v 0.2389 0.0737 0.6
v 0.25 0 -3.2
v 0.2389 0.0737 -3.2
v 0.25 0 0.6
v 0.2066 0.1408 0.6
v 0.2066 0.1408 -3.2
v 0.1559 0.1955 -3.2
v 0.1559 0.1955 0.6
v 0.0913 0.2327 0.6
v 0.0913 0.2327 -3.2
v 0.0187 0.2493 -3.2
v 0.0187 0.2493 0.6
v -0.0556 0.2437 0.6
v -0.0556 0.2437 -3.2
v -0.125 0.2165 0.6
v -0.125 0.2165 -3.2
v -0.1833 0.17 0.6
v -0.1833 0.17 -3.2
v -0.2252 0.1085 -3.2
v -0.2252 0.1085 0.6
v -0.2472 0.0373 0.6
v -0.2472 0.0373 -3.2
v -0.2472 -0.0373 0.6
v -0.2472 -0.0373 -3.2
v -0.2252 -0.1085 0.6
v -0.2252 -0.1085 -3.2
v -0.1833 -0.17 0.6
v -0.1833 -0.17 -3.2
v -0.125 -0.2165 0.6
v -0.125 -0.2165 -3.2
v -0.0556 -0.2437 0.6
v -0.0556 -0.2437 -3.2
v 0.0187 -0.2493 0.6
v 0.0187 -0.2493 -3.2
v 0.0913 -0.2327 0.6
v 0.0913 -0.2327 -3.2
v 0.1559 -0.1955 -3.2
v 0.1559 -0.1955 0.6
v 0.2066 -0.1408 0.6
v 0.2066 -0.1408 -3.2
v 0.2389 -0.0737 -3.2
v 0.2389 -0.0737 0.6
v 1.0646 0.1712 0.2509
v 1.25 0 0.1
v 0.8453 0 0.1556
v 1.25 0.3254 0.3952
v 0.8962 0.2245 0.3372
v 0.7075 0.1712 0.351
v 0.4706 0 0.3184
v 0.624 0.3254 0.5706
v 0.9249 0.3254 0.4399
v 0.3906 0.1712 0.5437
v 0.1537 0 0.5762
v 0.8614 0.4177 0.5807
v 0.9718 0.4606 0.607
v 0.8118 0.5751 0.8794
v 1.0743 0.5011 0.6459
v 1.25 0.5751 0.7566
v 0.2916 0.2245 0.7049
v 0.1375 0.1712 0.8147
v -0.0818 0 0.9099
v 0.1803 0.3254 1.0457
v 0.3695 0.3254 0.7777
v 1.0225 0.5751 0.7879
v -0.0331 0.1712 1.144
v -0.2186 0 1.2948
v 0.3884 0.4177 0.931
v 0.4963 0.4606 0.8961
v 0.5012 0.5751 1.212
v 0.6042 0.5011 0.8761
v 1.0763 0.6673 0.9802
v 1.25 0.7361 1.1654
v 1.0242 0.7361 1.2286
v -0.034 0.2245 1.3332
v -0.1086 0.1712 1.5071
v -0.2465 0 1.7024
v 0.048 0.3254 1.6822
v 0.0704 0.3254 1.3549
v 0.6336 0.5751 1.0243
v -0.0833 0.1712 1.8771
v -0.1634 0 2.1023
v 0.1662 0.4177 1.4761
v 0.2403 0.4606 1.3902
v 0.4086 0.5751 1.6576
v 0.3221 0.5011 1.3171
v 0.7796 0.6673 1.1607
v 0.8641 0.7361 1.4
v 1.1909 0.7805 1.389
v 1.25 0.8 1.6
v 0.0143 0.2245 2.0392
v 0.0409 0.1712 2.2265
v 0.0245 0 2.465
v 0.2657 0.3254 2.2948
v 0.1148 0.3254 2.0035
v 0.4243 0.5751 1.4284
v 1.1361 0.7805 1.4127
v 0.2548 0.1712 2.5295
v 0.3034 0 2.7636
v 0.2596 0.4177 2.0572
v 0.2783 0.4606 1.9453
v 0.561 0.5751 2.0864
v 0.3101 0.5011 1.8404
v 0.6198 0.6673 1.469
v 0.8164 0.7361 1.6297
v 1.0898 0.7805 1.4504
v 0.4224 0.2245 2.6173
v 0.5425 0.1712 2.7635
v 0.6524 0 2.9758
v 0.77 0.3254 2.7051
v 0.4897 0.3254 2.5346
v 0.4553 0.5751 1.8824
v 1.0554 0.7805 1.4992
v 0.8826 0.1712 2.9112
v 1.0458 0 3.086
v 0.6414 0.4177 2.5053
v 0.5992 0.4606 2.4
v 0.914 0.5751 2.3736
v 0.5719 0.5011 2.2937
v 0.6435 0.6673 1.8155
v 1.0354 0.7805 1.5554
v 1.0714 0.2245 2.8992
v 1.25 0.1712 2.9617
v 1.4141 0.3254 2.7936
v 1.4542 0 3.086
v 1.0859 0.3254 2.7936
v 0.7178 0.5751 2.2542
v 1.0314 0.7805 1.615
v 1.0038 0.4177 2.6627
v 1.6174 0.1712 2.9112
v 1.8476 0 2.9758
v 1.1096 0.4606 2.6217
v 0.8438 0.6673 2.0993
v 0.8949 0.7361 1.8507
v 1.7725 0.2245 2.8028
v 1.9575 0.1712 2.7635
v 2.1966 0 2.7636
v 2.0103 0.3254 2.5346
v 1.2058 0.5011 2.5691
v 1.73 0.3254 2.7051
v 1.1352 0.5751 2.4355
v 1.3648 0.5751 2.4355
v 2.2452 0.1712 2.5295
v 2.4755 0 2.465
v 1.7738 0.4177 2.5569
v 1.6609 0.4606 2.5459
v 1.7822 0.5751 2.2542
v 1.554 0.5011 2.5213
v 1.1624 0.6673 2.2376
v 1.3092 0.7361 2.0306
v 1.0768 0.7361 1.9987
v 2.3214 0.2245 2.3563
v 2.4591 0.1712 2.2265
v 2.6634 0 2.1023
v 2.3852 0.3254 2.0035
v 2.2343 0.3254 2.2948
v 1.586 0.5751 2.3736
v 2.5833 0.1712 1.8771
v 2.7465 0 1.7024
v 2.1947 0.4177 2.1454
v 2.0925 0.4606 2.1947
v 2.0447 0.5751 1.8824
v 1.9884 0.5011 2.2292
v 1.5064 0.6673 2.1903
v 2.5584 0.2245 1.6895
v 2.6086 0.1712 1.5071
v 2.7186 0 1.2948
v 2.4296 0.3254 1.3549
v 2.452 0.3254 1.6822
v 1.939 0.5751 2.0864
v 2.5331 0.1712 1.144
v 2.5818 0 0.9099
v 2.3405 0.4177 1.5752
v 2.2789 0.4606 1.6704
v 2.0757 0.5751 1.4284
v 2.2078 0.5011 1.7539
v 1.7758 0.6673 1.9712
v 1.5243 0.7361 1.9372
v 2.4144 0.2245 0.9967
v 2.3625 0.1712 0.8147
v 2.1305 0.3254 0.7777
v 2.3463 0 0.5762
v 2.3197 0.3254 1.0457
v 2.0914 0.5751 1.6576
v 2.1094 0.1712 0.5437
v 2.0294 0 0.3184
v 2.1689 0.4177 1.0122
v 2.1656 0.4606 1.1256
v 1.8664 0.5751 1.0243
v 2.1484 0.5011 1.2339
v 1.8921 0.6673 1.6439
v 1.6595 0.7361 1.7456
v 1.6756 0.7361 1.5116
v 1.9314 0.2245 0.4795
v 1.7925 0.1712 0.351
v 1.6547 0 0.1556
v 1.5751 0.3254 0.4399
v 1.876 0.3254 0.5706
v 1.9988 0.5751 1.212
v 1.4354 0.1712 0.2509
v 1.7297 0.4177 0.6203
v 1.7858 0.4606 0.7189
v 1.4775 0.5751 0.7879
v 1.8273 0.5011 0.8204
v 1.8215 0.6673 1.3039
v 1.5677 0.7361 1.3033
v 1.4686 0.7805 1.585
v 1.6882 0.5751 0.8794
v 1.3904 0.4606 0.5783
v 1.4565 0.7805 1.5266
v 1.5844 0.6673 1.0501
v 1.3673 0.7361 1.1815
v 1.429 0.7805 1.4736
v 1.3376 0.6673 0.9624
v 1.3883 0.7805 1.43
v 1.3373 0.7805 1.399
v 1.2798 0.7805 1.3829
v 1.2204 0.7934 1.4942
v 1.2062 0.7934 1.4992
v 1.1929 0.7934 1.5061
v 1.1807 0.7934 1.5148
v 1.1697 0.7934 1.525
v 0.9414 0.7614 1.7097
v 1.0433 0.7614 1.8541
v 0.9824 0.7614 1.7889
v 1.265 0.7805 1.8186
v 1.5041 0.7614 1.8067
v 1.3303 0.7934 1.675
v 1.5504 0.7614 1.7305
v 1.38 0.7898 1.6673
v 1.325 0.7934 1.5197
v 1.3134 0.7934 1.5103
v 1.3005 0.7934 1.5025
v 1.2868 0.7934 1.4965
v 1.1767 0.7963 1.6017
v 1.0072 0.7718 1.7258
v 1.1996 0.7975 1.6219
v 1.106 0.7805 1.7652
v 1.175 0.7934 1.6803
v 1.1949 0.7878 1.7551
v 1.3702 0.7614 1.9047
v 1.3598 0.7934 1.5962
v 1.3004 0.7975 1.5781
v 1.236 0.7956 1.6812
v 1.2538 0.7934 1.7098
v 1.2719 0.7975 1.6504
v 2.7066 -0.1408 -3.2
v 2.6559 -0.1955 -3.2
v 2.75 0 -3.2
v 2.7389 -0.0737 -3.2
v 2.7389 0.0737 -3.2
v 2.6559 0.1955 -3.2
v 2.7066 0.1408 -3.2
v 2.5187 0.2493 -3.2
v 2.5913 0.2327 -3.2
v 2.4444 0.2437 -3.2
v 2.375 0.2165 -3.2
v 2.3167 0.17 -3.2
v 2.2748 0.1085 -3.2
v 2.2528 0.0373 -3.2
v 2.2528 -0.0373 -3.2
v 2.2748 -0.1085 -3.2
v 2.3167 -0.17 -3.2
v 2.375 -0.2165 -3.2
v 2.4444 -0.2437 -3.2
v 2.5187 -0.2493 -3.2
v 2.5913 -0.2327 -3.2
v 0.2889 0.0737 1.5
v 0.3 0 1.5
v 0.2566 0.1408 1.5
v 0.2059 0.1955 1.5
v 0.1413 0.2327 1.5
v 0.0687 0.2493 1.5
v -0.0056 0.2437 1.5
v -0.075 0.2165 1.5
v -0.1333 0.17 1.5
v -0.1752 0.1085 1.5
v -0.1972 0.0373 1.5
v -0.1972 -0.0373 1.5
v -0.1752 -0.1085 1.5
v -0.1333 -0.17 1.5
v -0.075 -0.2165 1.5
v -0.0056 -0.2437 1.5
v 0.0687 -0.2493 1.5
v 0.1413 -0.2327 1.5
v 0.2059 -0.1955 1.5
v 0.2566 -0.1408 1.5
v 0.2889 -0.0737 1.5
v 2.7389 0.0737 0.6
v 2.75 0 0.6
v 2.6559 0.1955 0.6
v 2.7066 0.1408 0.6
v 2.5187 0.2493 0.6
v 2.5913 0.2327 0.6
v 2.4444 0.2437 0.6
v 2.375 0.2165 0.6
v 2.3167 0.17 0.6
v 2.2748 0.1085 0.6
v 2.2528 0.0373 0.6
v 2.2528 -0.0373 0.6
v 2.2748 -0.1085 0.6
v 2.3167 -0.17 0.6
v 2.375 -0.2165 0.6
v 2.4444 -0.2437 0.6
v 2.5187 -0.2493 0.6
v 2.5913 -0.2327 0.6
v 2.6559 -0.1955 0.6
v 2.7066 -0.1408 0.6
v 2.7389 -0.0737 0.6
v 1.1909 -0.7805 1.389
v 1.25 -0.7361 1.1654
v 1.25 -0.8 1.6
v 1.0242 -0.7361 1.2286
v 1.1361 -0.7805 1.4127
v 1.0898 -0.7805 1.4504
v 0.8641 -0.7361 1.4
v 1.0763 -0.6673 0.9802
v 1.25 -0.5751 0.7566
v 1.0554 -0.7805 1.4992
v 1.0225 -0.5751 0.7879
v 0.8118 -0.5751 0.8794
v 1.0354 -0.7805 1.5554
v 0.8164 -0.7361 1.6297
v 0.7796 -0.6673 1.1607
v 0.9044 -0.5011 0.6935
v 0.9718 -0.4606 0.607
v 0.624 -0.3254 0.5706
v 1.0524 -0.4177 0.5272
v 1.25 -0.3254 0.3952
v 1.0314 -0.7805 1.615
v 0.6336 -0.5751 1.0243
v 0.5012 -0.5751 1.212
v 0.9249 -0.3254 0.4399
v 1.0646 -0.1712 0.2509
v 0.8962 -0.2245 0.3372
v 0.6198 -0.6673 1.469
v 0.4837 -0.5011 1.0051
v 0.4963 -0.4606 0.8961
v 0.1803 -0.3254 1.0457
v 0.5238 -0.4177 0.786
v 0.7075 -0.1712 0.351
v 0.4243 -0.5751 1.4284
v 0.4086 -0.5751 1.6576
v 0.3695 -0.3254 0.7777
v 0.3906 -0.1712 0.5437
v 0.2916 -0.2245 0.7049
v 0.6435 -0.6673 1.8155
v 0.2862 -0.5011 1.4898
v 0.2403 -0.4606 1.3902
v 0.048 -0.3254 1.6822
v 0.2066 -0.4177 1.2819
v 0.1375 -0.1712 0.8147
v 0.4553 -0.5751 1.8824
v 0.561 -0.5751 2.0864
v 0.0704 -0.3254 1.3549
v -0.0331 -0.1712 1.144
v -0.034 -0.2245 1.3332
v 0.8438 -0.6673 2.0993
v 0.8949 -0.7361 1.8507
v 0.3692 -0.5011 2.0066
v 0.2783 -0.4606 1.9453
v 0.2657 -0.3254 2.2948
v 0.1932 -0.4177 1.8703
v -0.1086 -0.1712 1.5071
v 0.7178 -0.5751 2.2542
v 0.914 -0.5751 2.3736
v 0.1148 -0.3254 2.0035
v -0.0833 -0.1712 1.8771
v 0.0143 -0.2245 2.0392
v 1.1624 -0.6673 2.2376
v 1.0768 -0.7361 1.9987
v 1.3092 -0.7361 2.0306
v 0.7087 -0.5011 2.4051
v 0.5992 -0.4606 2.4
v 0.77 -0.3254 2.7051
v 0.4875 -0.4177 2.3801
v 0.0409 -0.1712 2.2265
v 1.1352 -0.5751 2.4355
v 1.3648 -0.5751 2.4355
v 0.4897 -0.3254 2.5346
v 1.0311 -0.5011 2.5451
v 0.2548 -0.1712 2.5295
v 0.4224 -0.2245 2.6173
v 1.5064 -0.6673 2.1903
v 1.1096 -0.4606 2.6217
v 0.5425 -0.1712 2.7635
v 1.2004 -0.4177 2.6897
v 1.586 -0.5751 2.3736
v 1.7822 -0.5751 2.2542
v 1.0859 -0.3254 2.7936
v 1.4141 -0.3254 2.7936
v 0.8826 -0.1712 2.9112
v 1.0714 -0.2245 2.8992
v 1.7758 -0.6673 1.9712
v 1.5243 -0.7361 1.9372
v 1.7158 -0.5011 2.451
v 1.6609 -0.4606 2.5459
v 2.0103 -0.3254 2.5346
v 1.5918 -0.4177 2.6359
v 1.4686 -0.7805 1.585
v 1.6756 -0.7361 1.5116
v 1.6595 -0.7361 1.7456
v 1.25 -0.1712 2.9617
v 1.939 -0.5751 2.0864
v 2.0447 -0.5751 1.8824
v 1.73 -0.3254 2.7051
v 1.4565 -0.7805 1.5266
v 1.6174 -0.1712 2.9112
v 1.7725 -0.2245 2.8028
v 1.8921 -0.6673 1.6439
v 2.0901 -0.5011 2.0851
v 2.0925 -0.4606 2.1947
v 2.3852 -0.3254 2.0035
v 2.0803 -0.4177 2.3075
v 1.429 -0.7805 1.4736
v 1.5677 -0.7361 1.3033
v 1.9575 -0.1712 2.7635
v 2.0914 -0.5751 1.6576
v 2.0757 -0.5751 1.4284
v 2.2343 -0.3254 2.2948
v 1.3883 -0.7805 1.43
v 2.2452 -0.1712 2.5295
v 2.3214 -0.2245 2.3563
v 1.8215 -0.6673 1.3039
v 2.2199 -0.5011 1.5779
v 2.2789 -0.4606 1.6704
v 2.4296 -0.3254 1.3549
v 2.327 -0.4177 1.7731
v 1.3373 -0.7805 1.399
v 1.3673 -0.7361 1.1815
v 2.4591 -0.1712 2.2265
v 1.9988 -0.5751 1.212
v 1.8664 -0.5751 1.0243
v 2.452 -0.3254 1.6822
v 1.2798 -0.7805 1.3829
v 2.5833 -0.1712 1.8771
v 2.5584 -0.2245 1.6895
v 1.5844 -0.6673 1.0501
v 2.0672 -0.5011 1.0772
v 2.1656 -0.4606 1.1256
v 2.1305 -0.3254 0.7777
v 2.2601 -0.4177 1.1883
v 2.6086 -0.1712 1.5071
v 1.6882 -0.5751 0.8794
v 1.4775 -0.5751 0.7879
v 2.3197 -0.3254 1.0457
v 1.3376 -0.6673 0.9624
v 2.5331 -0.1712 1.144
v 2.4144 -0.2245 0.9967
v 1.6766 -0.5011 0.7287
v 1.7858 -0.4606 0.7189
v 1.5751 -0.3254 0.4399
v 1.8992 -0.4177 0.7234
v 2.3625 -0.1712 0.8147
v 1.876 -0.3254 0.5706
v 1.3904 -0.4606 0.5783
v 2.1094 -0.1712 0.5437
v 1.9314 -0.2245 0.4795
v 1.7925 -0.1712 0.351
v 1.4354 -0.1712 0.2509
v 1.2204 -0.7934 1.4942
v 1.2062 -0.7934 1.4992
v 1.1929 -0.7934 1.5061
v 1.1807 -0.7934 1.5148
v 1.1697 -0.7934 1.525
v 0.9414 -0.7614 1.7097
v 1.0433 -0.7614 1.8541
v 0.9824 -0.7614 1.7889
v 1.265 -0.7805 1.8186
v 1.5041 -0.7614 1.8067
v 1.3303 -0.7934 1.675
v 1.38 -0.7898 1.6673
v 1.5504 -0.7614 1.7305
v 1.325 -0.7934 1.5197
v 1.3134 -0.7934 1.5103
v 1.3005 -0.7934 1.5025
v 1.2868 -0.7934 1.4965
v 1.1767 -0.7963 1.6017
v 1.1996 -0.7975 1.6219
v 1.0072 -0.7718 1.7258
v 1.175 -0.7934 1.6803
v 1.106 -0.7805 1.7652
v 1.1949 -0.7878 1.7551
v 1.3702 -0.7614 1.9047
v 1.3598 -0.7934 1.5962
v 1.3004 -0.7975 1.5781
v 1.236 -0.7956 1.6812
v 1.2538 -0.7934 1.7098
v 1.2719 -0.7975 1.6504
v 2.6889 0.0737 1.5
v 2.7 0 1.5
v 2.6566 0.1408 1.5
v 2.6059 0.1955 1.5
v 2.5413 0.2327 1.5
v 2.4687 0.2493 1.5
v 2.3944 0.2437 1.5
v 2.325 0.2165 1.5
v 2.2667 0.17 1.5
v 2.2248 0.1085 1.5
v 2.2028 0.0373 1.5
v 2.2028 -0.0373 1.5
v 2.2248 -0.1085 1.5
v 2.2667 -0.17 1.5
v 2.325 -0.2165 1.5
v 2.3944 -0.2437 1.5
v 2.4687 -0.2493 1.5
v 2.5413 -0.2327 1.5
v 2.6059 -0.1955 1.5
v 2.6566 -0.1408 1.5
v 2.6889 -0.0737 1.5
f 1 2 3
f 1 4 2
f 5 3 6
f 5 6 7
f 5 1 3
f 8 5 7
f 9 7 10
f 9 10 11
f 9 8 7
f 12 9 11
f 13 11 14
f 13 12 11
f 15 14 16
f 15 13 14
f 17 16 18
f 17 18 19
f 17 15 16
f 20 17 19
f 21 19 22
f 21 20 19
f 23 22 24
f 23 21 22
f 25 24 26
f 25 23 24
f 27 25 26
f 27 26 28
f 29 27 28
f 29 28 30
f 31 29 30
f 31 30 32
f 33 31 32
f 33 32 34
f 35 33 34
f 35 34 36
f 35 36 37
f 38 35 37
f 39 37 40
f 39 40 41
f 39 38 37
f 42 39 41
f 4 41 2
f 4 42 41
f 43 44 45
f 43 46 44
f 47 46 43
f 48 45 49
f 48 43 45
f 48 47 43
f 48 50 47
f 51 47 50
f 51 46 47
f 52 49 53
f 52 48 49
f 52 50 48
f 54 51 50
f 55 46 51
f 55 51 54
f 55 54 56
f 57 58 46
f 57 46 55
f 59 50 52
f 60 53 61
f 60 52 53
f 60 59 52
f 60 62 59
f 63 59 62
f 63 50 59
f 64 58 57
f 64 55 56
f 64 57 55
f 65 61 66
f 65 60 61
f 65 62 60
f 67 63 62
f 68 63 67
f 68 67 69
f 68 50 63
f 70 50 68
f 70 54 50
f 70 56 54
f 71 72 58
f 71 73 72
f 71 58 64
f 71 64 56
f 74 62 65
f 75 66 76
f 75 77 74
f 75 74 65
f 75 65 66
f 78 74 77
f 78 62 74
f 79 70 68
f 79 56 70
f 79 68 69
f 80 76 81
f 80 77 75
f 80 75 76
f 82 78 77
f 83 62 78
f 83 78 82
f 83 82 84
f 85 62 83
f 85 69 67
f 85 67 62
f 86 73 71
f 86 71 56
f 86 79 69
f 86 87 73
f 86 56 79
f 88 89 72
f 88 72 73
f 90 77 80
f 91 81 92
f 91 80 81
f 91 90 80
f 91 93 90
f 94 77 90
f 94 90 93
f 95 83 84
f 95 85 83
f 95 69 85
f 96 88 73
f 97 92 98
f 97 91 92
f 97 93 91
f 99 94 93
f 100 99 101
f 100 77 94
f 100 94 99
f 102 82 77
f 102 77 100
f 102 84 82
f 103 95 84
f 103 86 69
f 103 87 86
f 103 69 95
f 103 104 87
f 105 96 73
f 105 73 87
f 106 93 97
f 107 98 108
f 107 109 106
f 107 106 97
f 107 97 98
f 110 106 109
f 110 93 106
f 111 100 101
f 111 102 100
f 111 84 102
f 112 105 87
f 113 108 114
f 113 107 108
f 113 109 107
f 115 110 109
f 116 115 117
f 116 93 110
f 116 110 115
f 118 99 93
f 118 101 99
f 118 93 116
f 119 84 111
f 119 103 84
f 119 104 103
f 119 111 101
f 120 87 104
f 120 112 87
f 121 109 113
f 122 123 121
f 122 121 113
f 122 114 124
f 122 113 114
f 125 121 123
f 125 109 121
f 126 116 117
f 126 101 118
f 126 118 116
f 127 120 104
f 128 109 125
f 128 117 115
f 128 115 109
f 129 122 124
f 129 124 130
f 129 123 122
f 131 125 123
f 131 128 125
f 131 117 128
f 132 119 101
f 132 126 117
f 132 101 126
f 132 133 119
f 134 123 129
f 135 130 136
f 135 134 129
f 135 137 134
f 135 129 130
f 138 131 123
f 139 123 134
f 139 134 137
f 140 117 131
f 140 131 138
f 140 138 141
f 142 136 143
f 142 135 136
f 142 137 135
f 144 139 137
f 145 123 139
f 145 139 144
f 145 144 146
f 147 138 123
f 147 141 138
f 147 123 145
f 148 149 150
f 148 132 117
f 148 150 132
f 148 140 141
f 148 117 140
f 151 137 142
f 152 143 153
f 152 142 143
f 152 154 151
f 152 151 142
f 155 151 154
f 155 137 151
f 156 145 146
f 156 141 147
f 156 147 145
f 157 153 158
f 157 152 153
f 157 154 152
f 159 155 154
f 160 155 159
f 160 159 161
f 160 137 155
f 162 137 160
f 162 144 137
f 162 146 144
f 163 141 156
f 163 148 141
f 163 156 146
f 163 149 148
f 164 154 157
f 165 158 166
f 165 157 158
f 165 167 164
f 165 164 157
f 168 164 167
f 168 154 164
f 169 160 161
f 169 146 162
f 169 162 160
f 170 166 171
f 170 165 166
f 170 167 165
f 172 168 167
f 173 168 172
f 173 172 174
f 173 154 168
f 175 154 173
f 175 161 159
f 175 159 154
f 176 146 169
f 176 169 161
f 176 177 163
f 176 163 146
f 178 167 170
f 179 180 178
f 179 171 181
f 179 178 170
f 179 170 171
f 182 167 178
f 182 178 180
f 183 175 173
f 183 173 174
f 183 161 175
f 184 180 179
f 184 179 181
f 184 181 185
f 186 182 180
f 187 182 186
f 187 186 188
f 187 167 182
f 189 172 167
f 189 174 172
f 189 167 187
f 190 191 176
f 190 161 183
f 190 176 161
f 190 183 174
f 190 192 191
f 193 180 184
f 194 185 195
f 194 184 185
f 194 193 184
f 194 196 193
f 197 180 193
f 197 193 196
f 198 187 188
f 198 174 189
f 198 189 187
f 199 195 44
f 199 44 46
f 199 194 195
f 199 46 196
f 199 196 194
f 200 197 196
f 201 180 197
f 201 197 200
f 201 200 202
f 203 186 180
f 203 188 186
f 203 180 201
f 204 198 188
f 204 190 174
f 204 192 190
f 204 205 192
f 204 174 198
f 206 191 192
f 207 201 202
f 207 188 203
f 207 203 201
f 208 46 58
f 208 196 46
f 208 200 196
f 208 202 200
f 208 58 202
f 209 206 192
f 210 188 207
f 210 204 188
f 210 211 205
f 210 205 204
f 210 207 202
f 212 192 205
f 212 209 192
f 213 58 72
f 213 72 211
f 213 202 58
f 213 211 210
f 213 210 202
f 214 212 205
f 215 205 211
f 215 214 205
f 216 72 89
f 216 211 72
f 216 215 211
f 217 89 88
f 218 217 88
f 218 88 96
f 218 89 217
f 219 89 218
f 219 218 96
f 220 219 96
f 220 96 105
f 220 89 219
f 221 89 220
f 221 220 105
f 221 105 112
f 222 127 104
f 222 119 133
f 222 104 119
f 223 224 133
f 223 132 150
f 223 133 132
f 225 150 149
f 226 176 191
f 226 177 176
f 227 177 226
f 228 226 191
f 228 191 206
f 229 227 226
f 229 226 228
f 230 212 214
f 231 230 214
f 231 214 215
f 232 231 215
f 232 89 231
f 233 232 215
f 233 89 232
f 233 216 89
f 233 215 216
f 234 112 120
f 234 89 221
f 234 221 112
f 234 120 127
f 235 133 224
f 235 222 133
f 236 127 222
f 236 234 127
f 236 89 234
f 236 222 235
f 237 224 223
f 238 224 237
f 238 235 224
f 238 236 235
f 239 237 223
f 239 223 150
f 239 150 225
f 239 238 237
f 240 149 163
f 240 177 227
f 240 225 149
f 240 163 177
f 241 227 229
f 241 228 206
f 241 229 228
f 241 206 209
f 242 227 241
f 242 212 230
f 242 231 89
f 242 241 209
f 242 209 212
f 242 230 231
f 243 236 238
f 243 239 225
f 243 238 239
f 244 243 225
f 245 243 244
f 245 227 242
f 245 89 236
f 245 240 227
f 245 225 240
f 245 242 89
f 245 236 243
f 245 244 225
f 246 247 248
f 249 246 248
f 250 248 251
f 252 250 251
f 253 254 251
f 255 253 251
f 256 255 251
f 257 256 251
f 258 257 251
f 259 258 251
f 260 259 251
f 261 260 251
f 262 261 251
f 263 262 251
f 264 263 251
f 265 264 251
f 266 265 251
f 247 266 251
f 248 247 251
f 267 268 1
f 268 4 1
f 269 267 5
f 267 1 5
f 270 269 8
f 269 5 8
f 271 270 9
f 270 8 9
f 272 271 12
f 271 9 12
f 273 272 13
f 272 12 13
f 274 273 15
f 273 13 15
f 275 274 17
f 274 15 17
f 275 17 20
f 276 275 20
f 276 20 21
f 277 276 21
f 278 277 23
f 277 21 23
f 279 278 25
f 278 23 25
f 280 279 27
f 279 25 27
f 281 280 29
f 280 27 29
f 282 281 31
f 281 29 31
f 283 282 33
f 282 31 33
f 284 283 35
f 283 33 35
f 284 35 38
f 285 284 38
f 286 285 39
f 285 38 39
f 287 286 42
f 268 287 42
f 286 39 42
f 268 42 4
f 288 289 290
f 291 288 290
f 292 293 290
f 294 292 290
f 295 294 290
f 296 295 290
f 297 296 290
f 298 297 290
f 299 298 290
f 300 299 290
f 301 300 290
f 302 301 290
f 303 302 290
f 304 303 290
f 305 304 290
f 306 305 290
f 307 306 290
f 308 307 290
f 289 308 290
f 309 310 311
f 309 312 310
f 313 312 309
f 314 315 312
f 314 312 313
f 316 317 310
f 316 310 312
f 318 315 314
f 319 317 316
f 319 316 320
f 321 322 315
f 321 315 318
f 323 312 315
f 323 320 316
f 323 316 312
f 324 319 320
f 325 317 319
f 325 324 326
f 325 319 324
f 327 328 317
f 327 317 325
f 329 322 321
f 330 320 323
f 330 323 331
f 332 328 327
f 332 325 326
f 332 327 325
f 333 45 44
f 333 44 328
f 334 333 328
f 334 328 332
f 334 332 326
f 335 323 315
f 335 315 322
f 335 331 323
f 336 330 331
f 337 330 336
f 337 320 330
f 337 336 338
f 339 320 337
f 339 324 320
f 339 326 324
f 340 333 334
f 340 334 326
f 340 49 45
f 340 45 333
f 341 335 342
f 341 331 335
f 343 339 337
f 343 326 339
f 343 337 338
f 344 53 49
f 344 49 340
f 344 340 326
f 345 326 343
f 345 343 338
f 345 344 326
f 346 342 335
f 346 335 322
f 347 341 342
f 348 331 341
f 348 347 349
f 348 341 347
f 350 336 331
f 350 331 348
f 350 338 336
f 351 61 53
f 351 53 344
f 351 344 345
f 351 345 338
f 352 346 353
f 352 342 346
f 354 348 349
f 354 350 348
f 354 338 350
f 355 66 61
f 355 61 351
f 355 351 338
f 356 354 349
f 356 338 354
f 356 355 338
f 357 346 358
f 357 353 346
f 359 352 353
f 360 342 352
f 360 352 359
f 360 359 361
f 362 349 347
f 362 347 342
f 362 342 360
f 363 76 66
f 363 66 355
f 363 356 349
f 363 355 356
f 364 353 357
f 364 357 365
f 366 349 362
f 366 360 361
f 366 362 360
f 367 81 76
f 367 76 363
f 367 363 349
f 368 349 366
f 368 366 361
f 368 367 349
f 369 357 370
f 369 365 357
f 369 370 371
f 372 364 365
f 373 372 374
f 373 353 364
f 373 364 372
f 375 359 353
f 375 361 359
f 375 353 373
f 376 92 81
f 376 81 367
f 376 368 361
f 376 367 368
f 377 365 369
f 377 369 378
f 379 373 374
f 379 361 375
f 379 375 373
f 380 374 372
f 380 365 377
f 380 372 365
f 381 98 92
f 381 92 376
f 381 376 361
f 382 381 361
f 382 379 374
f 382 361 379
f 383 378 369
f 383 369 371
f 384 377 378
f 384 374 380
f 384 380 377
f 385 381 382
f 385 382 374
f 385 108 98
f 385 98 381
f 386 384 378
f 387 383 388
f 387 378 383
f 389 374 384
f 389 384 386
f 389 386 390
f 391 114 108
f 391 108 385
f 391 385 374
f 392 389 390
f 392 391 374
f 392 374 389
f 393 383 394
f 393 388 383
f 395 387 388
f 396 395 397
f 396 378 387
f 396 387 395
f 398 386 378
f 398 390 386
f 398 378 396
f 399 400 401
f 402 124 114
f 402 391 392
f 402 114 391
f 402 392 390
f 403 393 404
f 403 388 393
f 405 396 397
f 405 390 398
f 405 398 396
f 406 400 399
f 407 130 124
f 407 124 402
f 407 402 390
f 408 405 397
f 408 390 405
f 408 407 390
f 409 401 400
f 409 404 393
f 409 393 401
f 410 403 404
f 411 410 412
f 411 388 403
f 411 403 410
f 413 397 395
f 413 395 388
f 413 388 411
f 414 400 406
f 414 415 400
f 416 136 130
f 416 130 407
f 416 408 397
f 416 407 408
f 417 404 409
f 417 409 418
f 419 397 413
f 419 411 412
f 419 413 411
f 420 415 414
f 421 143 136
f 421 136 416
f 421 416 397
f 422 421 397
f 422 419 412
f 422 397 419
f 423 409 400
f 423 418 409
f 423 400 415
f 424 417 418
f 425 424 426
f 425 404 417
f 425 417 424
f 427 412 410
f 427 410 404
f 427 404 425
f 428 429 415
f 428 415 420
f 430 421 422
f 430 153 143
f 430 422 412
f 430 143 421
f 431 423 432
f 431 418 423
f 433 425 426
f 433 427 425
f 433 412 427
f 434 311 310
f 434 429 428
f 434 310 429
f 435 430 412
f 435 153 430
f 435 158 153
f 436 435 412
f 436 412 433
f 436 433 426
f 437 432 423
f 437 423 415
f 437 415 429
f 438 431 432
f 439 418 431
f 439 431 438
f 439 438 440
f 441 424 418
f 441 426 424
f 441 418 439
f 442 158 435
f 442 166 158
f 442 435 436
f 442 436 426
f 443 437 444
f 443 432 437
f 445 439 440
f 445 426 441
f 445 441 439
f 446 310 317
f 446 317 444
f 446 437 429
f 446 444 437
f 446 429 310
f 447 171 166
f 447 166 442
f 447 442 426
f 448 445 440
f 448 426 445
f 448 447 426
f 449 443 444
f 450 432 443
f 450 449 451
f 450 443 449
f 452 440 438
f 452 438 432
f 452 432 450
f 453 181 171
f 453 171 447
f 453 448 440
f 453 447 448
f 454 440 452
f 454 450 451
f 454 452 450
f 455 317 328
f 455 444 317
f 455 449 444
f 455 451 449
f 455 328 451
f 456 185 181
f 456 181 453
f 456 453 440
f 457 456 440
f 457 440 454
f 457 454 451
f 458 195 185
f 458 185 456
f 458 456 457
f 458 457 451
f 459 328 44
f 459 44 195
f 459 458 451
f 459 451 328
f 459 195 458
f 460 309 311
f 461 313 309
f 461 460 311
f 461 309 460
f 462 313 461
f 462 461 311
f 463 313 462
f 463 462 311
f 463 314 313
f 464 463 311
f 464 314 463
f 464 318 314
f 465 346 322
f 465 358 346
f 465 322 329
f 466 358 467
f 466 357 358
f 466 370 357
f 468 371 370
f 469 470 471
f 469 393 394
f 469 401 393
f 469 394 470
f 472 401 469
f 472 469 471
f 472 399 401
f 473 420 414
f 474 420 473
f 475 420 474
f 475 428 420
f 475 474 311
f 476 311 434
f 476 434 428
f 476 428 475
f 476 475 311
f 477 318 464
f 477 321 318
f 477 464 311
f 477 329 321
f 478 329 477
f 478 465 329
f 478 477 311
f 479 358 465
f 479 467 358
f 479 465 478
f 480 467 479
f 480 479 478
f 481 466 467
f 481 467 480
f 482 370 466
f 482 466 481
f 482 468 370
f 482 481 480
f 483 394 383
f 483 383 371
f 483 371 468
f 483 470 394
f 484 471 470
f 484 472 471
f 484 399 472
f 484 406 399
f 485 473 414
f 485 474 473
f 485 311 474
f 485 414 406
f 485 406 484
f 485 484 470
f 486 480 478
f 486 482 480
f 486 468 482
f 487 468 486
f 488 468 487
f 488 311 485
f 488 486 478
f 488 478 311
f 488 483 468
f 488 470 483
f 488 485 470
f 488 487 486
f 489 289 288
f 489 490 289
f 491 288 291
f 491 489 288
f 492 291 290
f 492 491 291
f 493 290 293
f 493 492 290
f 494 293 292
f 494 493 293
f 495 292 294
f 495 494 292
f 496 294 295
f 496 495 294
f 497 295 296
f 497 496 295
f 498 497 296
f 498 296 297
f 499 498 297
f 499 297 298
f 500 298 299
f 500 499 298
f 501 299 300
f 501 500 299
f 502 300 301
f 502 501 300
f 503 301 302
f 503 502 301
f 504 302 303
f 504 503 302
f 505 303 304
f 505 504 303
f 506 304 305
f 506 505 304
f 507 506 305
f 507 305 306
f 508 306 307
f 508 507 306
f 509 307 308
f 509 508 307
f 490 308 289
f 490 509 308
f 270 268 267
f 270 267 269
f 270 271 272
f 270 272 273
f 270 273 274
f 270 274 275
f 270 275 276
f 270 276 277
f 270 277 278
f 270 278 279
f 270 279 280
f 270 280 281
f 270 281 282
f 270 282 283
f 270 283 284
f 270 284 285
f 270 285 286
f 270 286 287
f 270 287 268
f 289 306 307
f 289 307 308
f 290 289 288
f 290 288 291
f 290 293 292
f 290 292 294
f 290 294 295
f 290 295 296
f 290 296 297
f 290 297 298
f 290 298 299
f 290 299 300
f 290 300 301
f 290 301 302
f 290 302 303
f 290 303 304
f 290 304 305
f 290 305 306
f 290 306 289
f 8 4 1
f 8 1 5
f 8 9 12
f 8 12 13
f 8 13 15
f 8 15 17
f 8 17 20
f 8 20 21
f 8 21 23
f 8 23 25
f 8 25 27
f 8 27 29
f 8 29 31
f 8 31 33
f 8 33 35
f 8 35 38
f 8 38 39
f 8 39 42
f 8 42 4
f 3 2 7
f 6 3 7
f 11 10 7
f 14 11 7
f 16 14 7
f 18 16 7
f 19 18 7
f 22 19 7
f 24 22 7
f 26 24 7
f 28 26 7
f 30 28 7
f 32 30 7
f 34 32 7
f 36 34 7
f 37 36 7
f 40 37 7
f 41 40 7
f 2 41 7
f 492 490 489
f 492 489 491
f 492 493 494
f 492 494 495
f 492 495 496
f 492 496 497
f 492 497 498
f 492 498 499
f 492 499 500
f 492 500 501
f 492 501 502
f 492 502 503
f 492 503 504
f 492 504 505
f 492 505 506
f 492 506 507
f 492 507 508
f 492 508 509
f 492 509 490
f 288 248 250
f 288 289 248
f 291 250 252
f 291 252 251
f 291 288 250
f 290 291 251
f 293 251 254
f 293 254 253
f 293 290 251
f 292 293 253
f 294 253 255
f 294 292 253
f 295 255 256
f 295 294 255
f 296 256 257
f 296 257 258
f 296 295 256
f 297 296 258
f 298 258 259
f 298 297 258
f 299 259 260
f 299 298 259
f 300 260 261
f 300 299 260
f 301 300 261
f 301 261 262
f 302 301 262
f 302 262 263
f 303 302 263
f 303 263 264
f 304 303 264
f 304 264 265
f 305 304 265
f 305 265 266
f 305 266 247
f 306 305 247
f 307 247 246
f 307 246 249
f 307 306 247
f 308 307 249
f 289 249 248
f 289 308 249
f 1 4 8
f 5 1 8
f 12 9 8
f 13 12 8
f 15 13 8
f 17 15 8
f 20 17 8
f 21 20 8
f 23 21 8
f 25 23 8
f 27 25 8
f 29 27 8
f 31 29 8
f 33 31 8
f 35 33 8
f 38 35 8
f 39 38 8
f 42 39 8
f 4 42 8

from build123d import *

# Parameters (mm, degrees)
SKETCH001_R       = 0.25
PAD001_DEPTH      = 0.6
PAD001_DEPTH_BACK = 3.2
SKETCH002_R       = 0.25
SKETCH003_R       = 0.25
SKETCH004_R       = 0.25
SKETCH005_R       = 0.25


with BuildPart() as pad001:
    # Sketch001 → Pad001 (new body, two sides)
    with BuildSketch(Plane.XY) as pad001_sk:
        Circle(SKETCH001_R)
        with Locations((2.5, 0)):
            Circle(SKETCH001_R)
    extrude(amount=PAD001_DEPTH)
    extrude(pad001_sk.sketch, amount=-PAD001_DEPTH_BACK)


with BuildPart() as revolution:
    # Sketch → Revolution (revolve)
    with BuildSketch(Plane.YZ.offset(1.25)):
        with BuildLine():
            Line((-0.8, 1.6), (0.8, 1.6))
            ThreePointArc((0, 0.1), (0.575092, 0.756617), (0.8, 1.6))
            ThreePointArc((-0.8, 1.6), (-0.575092, 0.756617), (0, 0.1))
        make_face()
    revolve(axis=Axis((1.25, -3.32079, 1.6), (0, 1, 0)))


with BuildPart() as loft_body:
    # Sketch002 → Loft section 0
    with BuildSketch(Plane.XY.offset(1.5)):
        with Locations((0.05, 0)):
            Circle(SKETCH002_R)
    # Sketch003 → Loft section 1
    with BuildSketch(Plane.XY.offset(0.6)):
        Circle(SKETCH003_R)
    loft()


with BuildPart() as loft001:
    # Sketch004 → Loft001 section 0
    with BuildSketch(Plane.XY.offset(0.6)):
        with Locations((2.5, 0)):
            Circle(SKETCH004_R)
    # Sketch005 → Loft001 section 1
    with BuildSketch(Plane.XY.offset(1.5)):
        with Locations((2.45, 0)):
            Circle(SKETCH005_R)
    loft()


solid = Compound([pad001.part, revolution.part, loft_body.part, loft001.part])
